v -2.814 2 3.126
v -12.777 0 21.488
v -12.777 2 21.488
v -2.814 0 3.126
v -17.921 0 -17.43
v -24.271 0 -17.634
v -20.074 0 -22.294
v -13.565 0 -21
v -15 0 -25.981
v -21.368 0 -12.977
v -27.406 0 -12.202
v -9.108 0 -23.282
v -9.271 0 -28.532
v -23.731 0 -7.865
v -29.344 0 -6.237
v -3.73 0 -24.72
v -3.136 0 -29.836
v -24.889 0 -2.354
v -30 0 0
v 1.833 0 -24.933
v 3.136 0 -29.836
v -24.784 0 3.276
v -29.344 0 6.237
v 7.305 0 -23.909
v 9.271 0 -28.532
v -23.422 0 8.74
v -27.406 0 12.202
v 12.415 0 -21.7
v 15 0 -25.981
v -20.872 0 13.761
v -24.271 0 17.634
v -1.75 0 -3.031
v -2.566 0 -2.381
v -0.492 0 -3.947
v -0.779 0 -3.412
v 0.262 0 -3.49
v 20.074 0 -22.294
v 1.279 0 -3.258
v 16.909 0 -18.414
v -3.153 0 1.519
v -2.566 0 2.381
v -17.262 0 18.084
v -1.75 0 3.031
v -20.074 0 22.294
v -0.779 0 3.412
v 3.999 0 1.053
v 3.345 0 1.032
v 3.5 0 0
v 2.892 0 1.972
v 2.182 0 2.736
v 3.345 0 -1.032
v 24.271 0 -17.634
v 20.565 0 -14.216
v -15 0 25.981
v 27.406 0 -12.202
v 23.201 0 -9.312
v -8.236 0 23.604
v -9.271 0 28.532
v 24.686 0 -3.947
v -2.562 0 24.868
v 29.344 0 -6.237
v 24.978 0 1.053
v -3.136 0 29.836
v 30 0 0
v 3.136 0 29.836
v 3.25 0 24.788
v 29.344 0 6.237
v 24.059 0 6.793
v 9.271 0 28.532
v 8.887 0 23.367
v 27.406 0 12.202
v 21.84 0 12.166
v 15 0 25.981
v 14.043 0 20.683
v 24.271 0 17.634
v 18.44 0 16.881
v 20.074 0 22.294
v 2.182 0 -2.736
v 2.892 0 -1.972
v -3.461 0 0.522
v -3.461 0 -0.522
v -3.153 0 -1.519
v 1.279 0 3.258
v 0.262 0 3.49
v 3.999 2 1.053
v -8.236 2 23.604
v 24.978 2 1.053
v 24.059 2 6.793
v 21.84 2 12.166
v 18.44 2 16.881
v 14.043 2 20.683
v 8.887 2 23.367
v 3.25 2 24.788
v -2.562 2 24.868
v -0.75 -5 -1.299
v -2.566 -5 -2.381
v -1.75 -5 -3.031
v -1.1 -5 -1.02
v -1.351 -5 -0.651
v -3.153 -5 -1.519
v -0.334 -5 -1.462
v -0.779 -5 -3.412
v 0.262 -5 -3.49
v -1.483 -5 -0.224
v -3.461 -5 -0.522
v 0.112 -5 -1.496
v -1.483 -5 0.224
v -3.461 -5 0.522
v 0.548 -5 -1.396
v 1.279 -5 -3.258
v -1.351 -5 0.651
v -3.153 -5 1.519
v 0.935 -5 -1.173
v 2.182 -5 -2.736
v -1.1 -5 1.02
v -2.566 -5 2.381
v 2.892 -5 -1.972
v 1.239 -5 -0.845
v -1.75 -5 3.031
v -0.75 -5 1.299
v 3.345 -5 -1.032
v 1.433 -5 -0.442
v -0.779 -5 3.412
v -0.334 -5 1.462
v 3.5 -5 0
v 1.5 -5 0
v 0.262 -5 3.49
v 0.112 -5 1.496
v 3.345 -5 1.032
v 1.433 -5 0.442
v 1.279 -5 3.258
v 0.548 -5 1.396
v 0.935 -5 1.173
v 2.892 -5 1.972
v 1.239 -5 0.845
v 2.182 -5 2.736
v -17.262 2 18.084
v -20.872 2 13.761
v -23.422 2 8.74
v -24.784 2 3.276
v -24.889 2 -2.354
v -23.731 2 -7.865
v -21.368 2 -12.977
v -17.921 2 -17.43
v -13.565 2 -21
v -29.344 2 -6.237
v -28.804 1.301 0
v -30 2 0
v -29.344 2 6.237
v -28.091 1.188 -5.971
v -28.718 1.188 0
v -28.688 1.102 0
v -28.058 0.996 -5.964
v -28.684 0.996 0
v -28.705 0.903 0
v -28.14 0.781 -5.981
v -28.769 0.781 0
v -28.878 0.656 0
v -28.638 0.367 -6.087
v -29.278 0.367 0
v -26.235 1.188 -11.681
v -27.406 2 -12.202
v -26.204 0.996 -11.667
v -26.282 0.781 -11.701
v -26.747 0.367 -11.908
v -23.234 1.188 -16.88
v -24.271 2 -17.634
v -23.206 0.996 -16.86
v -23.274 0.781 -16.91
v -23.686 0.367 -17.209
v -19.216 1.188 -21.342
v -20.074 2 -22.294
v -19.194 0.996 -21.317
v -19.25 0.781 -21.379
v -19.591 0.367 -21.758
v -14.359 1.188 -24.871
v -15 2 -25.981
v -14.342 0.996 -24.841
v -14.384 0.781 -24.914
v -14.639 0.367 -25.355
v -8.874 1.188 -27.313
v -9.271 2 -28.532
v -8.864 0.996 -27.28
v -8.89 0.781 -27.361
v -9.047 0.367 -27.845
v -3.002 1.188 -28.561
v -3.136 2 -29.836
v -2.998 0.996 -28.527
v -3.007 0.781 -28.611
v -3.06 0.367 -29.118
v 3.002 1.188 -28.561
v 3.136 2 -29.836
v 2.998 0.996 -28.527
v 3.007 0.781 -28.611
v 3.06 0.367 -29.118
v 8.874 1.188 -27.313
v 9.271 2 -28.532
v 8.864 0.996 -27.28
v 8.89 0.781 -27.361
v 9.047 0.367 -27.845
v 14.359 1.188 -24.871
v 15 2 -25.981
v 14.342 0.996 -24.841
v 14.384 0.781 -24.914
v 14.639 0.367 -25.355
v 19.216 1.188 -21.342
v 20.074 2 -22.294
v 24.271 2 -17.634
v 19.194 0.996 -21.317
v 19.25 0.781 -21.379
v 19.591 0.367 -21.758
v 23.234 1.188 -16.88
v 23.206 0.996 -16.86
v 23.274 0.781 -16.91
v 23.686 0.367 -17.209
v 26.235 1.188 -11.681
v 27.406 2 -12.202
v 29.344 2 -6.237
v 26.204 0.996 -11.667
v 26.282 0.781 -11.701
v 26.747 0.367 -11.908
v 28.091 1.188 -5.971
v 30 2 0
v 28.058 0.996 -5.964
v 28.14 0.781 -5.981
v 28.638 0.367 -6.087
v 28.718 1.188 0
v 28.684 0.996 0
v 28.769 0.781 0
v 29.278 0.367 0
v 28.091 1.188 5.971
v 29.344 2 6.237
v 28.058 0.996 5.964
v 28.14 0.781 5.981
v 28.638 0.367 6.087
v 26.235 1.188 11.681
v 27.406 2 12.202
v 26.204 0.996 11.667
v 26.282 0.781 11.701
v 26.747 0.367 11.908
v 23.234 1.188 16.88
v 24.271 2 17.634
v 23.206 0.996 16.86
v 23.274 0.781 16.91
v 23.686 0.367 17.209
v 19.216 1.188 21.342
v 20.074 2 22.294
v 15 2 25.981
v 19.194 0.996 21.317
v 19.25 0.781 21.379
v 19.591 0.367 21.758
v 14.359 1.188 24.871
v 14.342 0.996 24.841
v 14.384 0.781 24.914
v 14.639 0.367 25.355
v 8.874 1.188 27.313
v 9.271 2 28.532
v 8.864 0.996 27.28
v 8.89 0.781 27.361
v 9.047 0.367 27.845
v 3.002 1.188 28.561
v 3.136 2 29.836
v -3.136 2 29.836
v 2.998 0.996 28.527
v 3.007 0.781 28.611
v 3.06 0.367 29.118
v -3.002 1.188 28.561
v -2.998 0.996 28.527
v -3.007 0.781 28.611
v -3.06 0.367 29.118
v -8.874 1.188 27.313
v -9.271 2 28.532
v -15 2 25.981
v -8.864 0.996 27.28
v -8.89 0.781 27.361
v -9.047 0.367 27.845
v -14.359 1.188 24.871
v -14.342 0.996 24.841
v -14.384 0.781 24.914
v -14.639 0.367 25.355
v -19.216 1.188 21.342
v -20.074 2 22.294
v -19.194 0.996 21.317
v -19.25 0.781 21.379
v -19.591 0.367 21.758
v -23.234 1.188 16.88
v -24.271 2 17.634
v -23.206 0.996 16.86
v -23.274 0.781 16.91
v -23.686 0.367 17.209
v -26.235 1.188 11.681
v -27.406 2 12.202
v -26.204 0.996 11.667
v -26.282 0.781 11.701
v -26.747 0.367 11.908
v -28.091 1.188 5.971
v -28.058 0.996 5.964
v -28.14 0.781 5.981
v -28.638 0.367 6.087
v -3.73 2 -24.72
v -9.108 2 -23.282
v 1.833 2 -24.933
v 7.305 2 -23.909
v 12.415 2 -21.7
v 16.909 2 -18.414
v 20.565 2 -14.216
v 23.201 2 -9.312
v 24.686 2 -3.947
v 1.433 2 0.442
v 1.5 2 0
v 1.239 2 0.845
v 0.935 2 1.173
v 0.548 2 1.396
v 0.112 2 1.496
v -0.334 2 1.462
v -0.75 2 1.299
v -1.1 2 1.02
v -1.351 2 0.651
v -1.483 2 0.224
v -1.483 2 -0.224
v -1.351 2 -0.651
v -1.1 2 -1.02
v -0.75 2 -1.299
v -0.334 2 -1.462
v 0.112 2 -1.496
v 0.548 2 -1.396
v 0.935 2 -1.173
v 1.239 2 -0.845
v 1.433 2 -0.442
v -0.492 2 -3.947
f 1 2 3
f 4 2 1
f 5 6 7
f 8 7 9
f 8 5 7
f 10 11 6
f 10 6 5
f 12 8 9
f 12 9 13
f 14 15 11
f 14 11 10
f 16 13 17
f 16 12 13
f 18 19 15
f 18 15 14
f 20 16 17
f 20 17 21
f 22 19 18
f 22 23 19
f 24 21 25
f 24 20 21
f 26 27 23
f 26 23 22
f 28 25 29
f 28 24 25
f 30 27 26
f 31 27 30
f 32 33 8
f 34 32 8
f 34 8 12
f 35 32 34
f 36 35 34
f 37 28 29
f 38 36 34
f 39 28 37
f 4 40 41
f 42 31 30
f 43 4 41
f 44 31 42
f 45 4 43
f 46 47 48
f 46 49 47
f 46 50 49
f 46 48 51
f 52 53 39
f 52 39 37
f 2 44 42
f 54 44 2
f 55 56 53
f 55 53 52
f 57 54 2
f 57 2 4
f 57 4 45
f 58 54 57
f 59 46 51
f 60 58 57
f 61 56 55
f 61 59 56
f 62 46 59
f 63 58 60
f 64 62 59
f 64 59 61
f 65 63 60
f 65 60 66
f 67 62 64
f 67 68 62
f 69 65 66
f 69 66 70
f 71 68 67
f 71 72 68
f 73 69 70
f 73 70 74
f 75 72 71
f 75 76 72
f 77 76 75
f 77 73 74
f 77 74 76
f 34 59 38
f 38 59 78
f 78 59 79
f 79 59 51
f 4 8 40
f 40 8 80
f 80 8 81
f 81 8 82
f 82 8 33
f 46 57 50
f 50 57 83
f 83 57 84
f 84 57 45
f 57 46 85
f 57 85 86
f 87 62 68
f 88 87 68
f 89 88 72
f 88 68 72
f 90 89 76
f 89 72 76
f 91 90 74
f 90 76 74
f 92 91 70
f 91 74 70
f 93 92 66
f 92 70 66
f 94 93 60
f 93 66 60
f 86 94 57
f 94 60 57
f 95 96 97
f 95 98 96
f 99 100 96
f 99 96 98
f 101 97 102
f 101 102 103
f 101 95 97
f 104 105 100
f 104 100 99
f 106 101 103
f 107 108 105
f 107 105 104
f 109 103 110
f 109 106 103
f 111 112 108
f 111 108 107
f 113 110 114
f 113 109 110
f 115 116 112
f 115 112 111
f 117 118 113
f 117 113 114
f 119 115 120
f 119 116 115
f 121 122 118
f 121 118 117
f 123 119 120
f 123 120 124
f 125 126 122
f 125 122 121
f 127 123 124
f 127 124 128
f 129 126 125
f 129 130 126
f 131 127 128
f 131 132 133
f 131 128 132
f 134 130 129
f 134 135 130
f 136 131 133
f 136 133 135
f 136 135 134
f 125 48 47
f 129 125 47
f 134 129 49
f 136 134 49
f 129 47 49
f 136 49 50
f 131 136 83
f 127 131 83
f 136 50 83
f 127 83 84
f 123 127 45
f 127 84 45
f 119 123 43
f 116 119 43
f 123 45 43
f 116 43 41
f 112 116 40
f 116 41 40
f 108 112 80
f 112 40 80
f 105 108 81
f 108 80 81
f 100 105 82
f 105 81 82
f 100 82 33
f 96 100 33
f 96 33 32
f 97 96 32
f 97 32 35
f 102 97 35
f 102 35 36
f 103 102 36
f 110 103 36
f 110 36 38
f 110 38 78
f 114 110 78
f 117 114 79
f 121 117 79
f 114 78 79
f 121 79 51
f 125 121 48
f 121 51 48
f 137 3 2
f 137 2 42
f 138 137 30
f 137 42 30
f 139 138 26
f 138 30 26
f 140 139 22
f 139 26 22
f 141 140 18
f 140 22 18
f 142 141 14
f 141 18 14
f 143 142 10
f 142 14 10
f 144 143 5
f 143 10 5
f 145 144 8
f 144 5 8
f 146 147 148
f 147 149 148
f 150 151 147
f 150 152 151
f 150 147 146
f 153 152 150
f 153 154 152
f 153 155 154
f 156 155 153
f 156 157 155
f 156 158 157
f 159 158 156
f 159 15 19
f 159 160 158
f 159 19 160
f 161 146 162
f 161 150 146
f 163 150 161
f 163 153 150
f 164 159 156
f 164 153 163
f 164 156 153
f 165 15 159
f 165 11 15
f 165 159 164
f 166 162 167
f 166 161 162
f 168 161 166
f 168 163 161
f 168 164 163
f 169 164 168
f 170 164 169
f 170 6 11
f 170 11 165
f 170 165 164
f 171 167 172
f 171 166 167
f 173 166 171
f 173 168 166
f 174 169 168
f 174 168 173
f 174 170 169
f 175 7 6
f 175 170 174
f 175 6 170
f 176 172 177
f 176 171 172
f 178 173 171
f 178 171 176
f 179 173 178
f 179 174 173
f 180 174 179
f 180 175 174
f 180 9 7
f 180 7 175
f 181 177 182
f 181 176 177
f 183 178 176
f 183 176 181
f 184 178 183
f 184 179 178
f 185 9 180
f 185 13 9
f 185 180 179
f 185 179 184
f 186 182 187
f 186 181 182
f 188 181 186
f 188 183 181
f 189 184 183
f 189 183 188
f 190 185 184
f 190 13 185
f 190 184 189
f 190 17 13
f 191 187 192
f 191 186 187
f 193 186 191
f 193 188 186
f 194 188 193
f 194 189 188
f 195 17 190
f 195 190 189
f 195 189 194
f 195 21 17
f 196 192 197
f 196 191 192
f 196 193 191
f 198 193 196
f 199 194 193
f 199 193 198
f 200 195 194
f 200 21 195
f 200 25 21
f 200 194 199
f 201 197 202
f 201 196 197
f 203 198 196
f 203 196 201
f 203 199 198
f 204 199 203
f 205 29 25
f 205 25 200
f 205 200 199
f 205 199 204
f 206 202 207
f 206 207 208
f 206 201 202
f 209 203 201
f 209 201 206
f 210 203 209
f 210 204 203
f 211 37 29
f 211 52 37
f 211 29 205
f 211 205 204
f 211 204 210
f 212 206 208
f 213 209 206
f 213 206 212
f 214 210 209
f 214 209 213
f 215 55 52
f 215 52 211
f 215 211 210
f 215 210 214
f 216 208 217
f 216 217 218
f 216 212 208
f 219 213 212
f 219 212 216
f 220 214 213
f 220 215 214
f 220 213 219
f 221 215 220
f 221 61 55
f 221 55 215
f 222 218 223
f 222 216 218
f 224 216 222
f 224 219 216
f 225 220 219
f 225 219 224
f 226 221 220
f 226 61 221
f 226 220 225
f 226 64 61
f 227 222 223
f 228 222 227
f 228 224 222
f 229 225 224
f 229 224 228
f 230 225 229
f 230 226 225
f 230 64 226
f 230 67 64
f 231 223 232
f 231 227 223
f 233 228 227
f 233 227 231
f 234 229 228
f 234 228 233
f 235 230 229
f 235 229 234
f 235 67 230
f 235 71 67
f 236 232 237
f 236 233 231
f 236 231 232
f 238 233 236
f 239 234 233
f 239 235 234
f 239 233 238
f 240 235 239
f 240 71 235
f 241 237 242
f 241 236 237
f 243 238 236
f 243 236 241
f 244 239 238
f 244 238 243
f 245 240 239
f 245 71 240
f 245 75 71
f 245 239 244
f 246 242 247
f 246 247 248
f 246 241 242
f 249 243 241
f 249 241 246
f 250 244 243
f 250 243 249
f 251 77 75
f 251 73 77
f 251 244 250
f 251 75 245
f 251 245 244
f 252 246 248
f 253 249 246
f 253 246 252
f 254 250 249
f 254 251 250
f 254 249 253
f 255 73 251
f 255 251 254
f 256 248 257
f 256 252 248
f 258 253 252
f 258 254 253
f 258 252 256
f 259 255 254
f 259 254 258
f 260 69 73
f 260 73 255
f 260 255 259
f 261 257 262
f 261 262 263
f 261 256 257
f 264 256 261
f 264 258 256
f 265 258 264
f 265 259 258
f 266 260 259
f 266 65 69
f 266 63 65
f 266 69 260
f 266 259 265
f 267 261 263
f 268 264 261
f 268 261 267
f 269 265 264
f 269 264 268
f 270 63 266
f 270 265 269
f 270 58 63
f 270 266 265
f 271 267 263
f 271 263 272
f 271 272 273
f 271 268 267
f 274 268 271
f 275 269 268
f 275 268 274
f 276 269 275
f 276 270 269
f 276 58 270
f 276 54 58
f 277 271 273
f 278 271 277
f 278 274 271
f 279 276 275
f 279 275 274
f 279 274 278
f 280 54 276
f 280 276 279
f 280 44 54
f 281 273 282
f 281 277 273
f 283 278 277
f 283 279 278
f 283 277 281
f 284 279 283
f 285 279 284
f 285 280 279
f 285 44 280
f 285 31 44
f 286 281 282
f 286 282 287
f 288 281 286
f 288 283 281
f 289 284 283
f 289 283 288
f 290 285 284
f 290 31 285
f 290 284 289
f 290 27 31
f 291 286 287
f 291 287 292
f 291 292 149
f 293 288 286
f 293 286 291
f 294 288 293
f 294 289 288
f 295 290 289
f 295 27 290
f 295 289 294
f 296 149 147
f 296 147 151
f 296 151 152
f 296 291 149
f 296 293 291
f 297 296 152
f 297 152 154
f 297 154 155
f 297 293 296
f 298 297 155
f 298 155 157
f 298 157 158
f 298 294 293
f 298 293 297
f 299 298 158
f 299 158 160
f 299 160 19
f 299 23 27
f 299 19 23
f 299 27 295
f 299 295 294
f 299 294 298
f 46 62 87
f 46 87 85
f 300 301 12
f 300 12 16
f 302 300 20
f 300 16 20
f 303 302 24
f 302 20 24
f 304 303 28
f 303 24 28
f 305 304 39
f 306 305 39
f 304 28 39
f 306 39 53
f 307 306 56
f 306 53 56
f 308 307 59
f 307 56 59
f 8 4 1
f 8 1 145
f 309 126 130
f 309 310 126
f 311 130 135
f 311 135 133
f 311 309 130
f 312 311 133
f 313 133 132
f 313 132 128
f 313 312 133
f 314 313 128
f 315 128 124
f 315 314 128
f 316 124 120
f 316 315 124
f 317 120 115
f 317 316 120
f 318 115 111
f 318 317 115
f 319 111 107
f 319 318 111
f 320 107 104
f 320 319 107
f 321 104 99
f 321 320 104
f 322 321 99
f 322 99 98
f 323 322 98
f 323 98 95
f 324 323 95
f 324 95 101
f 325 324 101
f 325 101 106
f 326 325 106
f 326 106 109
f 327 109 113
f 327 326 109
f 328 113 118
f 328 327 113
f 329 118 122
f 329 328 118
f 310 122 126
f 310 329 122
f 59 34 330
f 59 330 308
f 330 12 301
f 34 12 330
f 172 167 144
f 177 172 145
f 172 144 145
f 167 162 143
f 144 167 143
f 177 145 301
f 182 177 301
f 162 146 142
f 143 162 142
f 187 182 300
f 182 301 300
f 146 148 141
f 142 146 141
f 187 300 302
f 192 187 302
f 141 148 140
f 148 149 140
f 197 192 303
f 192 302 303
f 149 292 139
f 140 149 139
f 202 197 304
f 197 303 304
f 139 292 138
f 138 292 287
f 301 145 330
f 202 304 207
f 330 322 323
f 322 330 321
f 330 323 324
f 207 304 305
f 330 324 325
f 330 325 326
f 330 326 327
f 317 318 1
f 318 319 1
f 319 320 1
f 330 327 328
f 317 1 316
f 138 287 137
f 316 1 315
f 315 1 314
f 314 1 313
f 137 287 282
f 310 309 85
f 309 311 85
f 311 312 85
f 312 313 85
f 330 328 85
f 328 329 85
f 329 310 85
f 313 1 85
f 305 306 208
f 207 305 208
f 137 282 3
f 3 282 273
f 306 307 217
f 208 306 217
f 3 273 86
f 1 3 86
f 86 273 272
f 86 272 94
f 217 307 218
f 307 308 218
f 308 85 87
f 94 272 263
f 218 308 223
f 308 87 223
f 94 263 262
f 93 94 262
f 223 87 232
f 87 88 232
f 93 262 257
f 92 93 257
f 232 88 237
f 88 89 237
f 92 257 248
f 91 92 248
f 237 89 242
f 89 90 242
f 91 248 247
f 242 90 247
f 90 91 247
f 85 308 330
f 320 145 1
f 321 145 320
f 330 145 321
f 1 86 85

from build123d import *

# Parameters (mm, degrees)
F2_R     = 25
F2_R_2   = 3.5
F2_R_3   = 1.5
F3_DEPTH = 1000
F5_DEPTH = 2
F6_DEPTH = 525
F7_DEPTH = 5


with BuildPart() as f1:
    # F0 (on Top) → F1 (revolve)
    with BuildSketch(Plane.XY):
        with BuildLine():
            Line((-30, 0), (0, 0))
            Line((0, 0), (0, 2))
            Line((0, 2), (-30, 2))
            add(Edge.make_bspline(
                [(-30, 2), (-28.8391709328, 1.4451311436), (-28.4943742579, 1.052107198), (-28.9041697979, 0.4963185056), (-30, 0)],
                knots=[0, 0, 0, 0, 0.4988572797, 1, 1, 1, 1], degree=3))
        make_face()
    revolve(axis=Axis((0, 1, 0), (0, -1, 0)))

    # F2 (on Front) → F3 (cut)
    with BuildSketch(Plane.XZ):
        Circle(F2_R)
        Circle(F2_R_2, mode=Mode.SUBTRACT)
        Circle(F2_R_3)
    extrude(amount=-F3_DEPTH, mode=Mode.SUBTRACT)

    # F4 (on Front) → F5 (join)
    with BuildSketch(Plane.XZ):
        Polygon((-2.8139011922, 3.1256922416), (-14.0678024009, -22.1267679741), (-9.5007999253, -24.1620783653), (-0.4918737939, -3.9470840711), (25.7489216609, -3.9470840711), (25.7489216609, 1.0529159289), (3.999228884, 1.0529159289), (-8.7940401669, 24.6323469789), (-13.1888537492, 22.2478945098), align=None)
    extrude(amount=-F5_DEPTH)

    # F2 (on Front) → F6 (cut, symmetric)
    with BuildSketch(Plane.XZ):
        Circle(F2_R_3)
    extrude(amount=F6_DEPTH, both=True, mode=Mode.SUBTRACT)

    # F2 (on Front) → F7 (join)
    with BuildSketch(Plane.XZ):
        Circle(F2_R_2)
        Circle(F2_R_3, mode=Mode.SUBTRACT)
    extrude(amount=F7_DEPTH)


solid = f1.part
